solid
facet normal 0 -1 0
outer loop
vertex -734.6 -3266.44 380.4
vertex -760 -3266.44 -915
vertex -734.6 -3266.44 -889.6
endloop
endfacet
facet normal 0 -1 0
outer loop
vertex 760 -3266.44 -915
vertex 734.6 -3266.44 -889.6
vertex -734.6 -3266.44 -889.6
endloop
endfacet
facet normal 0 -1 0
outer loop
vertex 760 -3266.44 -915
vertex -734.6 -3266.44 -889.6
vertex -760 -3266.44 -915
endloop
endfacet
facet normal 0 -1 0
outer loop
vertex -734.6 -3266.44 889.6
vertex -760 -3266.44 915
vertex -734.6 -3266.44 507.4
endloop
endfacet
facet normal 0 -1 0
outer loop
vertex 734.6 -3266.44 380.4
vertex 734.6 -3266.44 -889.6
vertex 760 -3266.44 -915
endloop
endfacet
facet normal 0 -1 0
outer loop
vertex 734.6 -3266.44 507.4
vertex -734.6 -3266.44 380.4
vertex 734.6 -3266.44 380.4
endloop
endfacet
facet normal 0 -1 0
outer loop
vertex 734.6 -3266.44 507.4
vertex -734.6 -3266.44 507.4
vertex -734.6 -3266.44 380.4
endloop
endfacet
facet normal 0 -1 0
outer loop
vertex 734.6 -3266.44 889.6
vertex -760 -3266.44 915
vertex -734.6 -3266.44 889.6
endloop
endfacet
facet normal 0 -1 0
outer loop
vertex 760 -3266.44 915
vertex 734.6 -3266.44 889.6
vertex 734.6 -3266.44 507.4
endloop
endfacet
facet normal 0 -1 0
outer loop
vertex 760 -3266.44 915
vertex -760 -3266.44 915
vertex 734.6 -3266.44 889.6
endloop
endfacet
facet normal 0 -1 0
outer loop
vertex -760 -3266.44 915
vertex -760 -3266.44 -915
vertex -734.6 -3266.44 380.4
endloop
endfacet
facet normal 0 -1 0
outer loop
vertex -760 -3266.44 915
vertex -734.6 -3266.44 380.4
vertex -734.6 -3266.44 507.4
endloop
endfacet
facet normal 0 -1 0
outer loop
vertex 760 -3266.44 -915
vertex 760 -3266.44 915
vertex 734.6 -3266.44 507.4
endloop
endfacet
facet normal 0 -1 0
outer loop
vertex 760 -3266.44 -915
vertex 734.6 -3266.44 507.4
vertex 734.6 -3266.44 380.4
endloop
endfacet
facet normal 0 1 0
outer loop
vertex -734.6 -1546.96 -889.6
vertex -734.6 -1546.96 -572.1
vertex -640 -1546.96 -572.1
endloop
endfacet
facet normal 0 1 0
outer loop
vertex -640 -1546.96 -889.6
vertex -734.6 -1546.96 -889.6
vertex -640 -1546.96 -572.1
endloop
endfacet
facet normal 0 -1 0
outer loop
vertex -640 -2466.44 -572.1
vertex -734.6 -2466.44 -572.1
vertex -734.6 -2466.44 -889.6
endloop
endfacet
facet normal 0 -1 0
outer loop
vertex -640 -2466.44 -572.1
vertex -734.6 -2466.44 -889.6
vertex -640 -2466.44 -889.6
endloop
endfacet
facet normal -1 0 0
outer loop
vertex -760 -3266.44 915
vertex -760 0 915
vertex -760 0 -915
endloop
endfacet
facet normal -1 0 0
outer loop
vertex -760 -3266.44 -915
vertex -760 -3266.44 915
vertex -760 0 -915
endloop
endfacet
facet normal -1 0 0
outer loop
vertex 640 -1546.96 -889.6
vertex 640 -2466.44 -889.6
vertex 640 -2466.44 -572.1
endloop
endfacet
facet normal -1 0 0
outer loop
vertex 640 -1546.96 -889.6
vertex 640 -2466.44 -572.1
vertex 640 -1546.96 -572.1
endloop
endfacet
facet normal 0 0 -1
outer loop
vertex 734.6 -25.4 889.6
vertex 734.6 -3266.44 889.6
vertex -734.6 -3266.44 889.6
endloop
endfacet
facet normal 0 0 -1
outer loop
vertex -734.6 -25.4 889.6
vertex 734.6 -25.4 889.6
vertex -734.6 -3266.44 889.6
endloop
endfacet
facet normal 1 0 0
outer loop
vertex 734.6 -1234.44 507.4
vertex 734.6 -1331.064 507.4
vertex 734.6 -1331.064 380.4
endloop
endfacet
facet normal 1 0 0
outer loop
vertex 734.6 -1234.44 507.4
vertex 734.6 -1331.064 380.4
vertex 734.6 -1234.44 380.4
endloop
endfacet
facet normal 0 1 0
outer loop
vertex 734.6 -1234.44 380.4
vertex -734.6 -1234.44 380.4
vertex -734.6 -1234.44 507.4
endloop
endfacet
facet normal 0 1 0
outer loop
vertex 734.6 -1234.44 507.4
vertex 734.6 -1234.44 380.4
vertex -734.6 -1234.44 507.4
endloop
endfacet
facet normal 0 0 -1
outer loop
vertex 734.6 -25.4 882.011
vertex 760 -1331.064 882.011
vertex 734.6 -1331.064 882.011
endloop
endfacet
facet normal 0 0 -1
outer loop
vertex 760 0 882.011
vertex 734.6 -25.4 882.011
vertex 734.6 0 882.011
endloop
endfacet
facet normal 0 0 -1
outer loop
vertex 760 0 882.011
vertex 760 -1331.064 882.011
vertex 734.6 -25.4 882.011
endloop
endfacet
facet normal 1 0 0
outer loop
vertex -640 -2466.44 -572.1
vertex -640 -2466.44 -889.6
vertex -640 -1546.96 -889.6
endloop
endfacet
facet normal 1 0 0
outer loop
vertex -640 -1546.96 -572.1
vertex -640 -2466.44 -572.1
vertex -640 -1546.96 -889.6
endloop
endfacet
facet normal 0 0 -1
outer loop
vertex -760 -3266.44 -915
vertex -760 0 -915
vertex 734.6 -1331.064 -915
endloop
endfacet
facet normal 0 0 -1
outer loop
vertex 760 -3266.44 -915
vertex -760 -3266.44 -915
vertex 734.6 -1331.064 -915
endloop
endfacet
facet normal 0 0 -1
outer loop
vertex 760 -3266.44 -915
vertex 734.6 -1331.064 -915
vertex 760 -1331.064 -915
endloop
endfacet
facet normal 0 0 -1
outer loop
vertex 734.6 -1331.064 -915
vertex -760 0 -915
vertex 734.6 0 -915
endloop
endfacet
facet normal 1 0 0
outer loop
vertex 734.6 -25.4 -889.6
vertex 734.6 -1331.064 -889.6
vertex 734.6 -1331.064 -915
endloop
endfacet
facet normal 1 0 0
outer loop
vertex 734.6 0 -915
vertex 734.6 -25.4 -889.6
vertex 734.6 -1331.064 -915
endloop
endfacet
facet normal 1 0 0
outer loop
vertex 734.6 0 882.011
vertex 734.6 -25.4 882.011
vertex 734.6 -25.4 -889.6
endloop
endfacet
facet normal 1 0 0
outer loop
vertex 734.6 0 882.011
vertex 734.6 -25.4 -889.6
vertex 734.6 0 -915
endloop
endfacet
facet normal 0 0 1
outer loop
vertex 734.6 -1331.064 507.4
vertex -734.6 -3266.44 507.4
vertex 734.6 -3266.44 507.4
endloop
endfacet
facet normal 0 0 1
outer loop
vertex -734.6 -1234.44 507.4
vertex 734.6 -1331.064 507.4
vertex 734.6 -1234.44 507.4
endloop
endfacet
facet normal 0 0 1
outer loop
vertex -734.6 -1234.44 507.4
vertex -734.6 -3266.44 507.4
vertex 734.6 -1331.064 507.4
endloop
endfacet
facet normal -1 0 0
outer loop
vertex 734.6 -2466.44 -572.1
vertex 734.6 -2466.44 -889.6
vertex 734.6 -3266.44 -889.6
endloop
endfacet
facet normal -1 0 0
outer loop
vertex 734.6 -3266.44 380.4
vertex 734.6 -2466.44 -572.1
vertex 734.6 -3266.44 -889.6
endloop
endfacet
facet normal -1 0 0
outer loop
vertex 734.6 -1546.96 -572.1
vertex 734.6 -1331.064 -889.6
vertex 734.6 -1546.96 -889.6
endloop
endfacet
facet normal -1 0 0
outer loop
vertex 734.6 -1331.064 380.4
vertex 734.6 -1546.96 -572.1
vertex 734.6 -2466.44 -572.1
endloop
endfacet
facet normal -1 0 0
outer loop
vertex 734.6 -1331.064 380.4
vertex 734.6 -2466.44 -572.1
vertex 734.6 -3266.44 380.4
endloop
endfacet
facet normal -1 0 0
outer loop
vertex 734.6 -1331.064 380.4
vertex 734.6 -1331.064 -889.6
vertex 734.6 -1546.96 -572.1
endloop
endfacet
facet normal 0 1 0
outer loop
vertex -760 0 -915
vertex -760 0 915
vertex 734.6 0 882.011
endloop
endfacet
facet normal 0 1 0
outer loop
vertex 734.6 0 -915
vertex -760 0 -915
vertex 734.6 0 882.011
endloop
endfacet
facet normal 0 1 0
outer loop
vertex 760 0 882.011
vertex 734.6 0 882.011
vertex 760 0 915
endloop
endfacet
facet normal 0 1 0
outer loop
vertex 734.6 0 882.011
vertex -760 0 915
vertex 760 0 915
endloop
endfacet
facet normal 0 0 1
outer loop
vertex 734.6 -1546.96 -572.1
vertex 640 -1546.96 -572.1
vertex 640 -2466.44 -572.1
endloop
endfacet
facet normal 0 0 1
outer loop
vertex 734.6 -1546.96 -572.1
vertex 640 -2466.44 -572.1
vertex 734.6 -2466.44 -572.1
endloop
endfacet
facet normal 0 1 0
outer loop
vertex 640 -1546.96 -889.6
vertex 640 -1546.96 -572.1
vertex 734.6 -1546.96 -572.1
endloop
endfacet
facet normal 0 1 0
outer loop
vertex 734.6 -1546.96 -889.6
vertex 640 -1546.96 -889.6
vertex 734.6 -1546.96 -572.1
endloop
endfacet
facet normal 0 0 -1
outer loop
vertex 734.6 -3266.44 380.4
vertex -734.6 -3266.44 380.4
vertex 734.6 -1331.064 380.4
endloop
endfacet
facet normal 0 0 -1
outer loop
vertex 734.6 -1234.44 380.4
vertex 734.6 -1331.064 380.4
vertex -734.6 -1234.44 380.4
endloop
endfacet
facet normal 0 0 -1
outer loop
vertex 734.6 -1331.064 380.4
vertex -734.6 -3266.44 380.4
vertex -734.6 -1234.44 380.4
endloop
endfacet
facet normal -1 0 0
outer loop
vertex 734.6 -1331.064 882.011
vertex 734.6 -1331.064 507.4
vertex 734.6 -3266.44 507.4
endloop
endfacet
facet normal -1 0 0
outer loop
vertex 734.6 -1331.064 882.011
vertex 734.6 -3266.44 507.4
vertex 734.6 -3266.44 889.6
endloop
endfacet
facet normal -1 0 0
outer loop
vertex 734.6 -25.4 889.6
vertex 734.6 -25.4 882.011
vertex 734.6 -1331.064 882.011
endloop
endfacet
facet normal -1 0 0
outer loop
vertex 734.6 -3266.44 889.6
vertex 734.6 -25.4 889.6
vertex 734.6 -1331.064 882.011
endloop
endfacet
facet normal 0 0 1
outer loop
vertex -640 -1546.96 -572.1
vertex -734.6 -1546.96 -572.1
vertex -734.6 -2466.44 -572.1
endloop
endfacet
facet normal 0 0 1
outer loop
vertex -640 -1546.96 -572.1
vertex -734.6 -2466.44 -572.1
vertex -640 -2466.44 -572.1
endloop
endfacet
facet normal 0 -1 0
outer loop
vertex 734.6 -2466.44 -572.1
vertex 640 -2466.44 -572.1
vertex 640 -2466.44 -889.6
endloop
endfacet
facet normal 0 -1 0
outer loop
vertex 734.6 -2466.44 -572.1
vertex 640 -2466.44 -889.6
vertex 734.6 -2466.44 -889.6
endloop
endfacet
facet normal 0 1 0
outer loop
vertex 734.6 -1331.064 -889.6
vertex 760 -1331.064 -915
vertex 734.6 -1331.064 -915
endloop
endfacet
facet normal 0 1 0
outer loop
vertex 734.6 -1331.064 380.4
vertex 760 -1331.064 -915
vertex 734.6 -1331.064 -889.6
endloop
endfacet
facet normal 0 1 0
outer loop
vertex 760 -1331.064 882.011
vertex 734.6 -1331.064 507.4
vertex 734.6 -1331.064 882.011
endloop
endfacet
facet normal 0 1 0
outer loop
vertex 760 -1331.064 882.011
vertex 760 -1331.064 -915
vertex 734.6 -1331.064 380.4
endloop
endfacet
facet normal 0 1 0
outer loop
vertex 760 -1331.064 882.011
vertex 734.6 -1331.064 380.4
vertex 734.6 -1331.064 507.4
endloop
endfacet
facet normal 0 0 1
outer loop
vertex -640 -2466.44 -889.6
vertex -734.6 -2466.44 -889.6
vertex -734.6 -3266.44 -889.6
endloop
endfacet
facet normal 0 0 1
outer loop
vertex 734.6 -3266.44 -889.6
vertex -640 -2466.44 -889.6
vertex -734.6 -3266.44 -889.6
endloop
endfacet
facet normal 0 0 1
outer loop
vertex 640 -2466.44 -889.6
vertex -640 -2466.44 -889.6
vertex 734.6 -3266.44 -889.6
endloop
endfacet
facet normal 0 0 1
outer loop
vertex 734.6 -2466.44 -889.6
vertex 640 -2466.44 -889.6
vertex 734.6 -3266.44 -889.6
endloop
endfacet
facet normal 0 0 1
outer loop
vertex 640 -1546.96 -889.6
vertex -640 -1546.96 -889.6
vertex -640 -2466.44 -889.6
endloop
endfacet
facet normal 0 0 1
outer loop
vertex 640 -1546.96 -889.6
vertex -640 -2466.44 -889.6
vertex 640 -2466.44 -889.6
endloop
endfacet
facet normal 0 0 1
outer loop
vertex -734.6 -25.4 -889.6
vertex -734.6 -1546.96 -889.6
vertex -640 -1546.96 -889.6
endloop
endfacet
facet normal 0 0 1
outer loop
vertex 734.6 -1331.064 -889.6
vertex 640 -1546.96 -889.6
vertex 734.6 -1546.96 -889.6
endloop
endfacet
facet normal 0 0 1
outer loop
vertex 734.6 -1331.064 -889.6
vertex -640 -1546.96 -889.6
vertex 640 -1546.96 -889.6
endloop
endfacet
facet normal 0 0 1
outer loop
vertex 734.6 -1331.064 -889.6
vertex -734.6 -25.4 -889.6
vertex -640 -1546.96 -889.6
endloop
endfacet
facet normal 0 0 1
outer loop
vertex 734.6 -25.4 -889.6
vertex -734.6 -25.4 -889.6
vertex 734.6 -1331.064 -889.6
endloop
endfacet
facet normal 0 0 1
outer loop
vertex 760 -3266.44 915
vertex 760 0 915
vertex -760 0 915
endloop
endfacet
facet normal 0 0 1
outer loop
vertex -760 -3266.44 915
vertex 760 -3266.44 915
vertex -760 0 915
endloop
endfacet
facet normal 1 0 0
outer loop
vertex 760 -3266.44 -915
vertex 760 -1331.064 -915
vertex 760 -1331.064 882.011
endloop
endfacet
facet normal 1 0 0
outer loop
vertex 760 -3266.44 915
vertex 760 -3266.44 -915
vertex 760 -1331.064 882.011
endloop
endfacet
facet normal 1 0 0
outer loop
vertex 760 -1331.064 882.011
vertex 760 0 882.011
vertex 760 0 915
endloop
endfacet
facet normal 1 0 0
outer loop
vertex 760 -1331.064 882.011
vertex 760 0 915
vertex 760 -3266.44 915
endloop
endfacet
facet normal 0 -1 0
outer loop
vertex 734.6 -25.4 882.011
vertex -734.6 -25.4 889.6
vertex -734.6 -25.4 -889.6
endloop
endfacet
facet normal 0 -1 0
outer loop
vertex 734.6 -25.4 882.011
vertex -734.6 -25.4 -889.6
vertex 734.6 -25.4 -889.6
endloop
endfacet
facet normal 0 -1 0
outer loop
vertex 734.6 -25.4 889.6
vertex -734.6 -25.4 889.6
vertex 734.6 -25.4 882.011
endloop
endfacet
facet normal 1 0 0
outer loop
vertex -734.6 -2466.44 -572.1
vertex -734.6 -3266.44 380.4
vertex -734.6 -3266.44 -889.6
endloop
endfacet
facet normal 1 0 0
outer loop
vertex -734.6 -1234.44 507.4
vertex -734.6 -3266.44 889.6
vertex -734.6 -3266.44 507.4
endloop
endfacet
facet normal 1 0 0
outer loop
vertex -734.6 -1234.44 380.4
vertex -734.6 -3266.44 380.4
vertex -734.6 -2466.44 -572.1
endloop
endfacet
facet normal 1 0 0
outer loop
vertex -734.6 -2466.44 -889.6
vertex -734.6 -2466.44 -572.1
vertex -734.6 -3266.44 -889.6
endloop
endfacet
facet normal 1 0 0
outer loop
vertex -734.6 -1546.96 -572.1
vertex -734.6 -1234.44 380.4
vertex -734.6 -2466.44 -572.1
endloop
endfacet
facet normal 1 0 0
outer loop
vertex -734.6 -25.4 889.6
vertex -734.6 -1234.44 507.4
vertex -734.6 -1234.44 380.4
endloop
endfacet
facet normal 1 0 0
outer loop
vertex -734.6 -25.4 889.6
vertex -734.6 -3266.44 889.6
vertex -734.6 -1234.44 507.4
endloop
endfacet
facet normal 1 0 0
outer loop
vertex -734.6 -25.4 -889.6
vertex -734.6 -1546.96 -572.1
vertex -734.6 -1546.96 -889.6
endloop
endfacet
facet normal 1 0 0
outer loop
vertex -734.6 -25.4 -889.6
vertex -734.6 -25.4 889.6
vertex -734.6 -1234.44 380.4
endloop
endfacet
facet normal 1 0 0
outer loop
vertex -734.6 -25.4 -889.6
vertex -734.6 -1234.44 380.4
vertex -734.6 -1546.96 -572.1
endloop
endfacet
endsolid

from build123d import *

# Parameters (mm, degrees)
F1_DEPTH = 3266.44
F2_T     = -25.4
F3_W     = 94.6
F3_H     = 919.48
F4_DEPTH = 317.5
F5_W     = 2032
F5_H     = 127
F6_DEPTH = 1469.2
F7_W     = 1331.0638666153
F7_H     = 1797.0106387138
F8_DEPTH = 25.4


with BuildPart() as f1:
    # F0 (on Front) → F1 (new body)
    with BuildSketch(Plane.XZ):
        Polygon((760, 915), (-760, 915), (760, -915), align=None)
        Polygon((760, -915), (-760, 915), (-760, -915), align=None)
    extrude(amount=F1_DEPTH)

    # F2
    f2_openings = [f1.faces().sort_by_distance(p)[0] for p in [
        (0, -3266.44, 0),
    ]]
    offset(amount=F2_T, openings=f2_openings)

    # F3 (on face) → F4 (join)
    with BuildSketch(Plane.XY.offset(-889.6)):
        with Locations((-687.3, -2006.7)):
            Rectangle(F3_W, F3_H)
        with Locations((687.3, -2006.7)):
            Rectangle(F3_W, F3_H)
    extrude(amount=F4_DEPTH)

    # F5 (on face) → F6 (join, through all)
    with BuildSketch(Plane.YZ.offset(-734.6)):
        with Locations((-2250.44, 443.9)):
            Rectangle(F5_W, F5_H)
    extrude(amount=F6_DEPTH)

    # F7 (on face) → F8 (cut, through all)
    with BuildSketch(Plane.YZ.offset(760)):
        with Locations((-665.5319333076, -16.4946806431)):
            Rectangle(F7_W, F7_H)
    extrude(amount=-F8_DEPTH, mode=Mode.SUBTRACT)


solid = f1.part
